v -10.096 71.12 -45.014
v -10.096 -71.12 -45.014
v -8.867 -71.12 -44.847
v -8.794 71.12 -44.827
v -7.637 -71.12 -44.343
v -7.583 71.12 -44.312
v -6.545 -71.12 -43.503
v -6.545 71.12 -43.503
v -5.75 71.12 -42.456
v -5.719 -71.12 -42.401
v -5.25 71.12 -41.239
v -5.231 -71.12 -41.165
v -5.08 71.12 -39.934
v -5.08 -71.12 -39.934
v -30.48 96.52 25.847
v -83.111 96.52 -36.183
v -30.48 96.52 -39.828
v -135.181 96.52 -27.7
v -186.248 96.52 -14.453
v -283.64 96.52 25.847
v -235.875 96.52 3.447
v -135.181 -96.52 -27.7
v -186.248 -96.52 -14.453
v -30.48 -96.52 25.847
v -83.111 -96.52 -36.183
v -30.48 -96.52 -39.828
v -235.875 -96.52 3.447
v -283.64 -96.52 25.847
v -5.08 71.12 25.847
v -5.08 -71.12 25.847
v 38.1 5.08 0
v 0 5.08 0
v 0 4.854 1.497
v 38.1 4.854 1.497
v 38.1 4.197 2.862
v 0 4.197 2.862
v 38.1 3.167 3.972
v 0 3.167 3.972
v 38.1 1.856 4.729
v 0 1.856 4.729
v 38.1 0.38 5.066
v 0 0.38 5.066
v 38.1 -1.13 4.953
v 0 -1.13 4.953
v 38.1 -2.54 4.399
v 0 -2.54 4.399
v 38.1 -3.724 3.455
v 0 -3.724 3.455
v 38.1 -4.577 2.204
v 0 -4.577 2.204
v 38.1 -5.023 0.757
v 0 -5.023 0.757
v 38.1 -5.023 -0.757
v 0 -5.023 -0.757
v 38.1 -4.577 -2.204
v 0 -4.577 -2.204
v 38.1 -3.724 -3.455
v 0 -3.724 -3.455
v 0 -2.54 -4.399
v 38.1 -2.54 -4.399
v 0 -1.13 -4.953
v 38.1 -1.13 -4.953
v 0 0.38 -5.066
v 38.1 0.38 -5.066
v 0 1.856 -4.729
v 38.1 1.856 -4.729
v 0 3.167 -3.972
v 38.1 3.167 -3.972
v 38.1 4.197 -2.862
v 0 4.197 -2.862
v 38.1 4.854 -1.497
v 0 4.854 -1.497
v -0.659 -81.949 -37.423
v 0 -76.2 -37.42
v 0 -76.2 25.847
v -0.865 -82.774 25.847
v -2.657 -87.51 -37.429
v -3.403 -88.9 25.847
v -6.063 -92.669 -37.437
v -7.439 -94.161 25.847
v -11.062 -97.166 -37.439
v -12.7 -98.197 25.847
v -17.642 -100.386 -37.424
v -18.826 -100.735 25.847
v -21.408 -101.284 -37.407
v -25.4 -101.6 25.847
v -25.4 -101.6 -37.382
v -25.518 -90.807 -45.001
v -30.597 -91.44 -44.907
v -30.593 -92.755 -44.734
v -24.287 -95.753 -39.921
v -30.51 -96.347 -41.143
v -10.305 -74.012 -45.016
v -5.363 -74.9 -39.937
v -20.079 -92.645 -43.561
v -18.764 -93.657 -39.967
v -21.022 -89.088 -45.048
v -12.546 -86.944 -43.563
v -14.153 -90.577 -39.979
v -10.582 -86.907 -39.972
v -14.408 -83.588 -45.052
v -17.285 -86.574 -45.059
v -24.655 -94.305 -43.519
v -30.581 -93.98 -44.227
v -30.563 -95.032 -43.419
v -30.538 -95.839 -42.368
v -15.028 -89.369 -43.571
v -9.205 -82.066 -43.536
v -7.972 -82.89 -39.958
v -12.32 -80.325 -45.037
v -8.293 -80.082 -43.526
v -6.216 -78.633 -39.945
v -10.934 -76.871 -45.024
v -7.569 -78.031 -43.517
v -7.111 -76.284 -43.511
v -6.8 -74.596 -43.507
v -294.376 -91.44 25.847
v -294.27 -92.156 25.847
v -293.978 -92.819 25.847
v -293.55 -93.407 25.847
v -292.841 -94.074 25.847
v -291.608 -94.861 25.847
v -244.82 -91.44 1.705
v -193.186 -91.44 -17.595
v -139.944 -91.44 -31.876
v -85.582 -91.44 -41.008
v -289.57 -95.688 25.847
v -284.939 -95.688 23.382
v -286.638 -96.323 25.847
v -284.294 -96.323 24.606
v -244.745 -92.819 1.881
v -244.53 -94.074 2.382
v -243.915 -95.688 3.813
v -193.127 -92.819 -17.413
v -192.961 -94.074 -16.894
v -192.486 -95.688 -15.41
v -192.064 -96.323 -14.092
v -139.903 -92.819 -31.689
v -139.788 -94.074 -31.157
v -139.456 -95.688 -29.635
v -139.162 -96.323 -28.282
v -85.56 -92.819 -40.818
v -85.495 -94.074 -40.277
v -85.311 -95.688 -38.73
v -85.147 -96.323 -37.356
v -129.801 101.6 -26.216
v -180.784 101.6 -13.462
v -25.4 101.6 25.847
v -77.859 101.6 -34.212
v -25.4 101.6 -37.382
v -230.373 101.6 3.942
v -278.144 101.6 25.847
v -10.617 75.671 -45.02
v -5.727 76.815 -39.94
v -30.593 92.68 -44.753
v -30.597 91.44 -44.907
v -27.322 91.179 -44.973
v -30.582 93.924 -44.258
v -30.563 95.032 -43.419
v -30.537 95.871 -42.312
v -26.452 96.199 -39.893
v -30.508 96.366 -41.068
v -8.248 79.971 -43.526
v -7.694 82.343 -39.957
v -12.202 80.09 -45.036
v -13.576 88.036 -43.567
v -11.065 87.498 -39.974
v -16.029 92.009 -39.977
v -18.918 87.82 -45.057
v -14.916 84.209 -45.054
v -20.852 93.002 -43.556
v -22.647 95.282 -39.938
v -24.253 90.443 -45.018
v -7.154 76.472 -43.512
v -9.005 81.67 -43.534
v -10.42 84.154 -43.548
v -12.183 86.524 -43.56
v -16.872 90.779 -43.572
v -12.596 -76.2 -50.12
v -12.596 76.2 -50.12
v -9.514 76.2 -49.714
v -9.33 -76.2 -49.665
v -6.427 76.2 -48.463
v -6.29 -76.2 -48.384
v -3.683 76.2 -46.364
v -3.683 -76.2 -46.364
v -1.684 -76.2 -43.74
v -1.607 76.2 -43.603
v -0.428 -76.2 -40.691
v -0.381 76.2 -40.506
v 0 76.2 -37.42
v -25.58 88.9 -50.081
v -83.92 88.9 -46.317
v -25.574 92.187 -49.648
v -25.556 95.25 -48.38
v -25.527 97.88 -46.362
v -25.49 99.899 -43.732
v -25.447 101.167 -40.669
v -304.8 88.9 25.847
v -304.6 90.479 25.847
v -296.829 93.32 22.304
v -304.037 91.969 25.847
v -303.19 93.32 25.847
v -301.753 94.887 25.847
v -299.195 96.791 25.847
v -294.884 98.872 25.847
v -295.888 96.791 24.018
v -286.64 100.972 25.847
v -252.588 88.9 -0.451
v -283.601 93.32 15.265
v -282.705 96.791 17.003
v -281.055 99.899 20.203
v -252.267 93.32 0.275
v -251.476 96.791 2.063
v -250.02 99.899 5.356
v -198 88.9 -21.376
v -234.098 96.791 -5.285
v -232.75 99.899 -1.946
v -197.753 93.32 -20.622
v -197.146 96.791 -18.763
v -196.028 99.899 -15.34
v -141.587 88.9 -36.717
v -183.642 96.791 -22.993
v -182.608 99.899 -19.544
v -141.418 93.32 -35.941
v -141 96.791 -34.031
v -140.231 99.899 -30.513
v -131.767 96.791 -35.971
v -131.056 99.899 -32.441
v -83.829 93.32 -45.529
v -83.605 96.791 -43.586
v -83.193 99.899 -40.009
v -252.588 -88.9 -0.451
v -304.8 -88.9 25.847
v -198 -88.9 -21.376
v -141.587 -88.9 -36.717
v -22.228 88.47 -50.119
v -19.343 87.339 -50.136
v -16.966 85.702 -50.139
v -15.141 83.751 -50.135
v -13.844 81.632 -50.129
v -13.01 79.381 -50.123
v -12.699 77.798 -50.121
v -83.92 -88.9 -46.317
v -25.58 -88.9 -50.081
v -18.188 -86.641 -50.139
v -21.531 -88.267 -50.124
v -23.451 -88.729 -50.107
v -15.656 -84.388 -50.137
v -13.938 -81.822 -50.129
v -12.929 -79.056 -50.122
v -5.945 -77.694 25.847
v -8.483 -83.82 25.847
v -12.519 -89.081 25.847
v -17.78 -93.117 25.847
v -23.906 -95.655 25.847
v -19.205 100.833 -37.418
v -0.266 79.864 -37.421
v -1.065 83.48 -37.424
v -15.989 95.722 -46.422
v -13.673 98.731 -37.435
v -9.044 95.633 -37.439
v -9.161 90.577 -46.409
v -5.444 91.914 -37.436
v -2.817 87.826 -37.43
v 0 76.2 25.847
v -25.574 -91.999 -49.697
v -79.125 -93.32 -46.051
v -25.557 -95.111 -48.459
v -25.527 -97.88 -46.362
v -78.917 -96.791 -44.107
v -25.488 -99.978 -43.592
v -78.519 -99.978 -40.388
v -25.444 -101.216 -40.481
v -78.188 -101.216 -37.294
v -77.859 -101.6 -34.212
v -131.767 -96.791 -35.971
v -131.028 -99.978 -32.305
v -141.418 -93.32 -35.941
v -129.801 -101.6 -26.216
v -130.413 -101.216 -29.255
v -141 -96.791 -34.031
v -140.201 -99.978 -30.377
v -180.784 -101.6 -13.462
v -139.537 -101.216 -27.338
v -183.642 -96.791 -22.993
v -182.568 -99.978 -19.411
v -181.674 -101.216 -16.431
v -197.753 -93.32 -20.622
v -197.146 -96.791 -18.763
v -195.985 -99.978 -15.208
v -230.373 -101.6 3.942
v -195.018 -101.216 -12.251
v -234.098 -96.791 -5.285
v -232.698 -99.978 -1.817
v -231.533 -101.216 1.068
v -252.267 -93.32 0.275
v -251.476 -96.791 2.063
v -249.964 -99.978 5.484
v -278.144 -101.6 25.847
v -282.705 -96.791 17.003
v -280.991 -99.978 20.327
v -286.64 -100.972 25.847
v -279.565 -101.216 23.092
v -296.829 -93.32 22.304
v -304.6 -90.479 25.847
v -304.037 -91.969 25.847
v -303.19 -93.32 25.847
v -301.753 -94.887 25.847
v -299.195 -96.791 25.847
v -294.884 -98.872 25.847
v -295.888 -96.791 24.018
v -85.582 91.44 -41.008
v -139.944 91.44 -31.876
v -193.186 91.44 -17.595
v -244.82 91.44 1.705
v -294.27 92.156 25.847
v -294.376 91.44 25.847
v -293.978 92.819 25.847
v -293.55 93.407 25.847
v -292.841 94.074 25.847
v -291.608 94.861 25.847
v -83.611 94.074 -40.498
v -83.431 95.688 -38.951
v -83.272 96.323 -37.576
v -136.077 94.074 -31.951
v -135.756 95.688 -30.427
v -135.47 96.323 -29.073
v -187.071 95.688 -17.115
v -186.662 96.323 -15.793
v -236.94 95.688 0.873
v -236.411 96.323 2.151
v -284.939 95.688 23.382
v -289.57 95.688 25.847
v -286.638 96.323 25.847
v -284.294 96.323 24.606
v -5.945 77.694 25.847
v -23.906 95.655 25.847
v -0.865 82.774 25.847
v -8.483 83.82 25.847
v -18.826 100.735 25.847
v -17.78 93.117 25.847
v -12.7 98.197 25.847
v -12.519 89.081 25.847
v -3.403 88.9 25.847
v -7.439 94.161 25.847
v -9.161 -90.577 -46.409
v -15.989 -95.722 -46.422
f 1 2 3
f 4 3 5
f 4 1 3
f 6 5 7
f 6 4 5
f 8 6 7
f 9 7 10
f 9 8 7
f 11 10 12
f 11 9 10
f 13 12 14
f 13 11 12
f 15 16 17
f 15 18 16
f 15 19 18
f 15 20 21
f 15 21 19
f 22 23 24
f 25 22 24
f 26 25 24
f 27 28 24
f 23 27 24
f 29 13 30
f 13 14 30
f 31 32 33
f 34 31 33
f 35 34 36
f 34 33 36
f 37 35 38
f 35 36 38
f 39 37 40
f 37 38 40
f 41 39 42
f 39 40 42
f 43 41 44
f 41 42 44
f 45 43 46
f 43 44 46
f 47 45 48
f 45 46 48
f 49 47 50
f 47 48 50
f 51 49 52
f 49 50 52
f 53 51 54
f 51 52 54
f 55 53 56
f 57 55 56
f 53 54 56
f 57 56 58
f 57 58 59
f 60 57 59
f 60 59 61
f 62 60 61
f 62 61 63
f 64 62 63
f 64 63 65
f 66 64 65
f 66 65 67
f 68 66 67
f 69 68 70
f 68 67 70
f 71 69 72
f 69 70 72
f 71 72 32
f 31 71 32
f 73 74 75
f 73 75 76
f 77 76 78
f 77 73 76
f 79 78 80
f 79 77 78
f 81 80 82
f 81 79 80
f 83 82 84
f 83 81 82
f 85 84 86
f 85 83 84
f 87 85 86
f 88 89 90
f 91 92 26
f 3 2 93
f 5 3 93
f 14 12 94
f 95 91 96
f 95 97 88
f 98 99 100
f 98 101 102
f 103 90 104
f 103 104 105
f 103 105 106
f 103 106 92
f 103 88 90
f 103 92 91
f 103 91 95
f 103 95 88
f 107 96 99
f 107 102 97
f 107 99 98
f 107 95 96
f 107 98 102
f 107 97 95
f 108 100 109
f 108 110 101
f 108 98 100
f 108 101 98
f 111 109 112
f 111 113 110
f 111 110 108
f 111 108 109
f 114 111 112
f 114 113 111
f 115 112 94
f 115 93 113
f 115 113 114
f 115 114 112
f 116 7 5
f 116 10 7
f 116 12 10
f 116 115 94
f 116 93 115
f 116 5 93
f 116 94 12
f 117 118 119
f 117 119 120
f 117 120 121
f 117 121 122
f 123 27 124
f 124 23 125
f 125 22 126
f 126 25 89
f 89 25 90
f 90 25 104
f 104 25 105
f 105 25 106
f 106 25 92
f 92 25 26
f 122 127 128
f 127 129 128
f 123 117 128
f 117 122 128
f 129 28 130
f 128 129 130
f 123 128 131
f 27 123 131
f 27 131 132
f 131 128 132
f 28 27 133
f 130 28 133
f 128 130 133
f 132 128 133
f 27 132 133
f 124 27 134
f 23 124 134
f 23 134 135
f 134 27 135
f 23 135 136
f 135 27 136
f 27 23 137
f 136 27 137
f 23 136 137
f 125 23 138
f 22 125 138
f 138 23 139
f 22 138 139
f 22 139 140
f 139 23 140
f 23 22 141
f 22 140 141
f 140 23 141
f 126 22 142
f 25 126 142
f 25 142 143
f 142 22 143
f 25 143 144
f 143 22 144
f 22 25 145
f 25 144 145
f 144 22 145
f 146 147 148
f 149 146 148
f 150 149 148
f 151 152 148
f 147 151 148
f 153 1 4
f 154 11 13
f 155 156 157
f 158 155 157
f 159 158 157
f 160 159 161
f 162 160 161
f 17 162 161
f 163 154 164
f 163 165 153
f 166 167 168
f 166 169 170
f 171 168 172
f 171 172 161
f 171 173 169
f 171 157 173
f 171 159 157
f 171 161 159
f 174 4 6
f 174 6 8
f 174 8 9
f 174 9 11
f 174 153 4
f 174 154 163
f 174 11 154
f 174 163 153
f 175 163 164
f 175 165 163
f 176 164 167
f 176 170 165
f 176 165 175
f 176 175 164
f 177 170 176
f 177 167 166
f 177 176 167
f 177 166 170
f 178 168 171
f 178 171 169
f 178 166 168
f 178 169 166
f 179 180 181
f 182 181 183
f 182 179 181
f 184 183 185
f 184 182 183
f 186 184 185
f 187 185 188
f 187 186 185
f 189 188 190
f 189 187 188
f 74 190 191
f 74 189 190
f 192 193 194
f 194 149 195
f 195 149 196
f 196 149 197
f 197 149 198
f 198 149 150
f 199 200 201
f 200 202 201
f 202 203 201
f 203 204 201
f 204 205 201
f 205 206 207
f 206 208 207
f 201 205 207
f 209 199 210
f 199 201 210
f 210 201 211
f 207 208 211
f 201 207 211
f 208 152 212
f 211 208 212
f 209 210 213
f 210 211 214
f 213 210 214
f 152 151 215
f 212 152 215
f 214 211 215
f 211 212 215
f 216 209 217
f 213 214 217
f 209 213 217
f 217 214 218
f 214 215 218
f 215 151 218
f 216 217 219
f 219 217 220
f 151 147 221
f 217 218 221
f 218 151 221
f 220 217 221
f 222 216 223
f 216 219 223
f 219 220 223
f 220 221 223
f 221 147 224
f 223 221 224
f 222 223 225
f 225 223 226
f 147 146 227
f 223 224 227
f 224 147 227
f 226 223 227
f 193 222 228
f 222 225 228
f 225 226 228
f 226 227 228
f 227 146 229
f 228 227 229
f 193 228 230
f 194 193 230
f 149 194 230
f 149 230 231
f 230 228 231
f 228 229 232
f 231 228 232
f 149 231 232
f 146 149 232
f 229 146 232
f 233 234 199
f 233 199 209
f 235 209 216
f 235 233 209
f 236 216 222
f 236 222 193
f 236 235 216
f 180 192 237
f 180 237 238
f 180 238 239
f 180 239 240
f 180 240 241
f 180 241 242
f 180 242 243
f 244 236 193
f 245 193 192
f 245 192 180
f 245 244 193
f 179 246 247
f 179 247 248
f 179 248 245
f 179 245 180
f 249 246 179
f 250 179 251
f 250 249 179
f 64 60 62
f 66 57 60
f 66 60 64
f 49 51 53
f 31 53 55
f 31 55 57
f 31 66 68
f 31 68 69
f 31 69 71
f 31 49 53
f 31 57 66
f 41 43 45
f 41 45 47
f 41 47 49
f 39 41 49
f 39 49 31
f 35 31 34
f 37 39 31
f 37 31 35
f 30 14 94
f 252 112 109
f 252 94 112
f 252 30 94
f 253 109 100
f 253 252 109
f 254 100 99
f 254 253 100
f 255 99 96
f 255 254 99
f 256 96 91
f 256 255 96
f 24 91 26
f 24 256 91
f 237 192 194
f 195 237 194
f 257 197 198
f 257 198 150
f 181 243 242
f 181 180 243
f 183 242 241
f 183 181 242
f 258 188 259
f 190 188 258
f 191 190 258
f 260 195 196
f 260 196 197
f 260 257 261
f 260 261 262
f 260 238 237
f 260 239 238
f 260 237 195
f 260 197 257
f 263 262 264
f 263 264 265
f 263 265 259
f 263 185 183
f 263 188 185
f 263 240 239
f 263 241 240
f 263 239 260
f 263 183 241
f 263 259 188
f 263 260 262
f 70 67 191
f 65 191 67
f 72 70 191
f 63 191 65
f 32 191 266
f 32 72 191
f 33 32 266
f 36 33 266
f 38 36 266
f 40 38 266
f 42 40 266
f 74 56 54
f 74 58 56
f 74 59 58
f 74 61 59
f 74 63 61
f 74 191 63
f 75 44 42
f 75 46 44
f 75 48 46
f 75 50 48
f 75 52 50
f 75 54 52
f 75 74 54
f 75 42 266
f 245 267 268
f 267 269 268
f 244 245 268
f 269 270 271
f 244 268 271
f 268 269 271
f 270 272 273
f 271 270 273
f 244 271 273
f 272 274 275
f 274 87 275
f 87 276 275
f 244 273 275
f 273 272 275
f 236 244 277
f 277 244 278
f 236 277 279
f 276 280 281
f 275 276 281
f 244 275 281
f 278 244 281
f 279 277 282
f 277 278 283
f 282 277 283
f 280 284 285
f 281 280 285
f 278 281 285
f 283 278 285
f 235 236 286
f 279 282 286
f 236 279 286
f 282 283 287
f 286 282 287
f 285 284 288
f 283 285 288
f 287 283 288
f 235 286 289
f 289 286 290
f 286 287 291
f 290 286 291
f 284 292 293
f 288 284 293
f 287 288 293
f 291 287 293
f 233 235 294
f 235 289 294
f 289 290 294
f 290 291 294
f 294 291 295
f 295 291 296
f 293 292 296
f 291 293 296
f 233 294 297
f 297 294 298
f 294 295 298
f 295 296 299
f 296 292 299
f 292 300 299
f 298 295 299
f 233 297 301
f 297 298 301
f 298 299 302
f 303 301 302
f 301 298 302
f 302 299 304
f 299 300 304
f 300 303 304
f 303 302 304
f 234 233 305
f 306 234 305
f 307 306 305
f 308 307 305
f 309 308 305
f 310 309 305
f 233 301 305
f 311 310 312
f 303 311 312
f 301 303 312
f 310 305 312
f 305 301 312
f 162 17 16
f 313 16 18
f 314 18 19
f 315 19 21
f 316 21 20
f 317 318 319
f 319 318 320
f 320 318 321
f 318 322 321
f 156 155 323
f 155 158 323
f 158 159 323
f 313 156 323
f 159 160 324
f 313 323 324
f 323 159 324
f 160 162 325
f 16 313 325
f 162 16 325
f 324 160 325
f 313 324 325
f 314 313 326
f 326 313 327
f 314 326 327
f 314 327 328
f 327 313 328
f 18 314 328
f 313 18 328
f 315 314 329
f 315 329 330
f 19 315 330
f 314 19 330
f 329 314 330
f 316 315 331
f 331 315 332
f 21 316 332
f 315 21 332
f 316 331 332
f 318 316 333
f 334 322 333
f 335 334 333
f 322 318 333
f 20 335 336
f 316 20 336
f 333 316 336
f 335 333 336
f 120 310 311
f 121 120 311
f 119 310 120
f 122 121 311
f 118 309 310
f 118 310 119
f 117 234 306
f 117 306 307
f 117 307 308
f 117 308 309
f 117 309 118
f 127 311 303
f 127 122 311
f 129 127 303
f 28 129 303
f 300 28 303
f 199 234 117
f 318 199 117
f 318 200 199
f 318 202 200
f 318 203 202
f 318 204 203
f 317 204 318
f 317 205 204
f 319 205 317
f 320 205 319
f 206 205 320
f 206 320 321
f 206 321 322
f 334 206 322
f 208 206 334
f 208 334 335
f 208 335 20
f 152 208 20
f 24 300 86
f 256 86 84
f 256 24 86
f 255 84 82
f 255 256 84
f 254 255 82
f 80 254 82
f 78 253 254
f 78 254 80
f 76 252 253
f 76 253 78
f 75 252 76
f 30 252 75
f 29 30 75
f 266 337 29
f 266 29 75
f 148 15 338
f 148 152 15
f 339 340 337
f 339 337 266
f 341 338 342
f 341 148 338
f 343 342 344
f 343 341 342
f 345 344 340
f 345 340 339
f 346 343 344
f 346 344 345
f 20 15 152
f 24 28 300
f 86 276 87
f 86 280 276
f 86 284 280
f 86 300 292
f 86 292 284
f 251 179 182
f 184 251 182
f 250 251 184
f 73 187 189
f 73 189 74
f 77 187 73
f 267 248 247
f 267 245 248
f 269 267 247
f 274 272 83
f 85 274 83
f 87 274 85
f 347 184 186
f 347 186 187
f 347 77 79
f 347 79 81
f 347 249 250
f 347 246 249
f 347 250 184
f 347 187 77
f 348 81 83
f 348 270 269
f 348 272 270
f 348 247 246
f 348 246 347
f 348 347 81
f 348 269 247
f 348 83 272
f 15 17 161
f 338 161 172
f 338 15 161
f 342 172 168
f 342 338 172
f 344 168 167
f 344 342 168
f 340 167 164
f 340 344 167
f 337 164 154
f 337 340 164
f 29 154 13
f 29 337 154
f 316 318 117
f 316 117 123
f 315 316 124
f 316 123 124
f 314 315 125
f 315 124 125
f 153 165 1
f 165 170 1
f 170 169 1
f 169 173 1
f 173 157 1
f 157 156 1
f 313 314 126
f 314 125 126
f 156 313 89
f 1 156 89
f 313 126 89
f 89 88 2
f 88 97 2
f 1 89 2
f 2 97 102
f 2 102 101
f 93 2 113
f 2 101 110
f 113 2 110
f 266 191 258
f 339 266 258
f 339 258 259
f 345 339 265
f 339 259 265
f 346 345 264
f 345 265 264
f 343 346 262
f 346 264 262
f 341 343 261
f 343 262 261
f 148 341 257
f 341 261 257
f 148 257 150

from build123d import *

# Parameters (mm, degrees)
F2_DEPTH     = 101.6
F3_T         = -5.08
F0_R         = 5.08
F4_DEPTH     = 38.1
F5_T4_DEPTH  = 134.2759536589
F5_S5_R      = 576.6246219757
F5_T6_DEPTH  = 71
F5_T10_DEPTH = 134.2759536589
F5_S11_R     = 576.6246219757
F5_T12_DEPTH = 71
F5_T13_DEPTH = 202.727744005
F6_R         = 12.7
F7_R         = 5.08


# Not quite as in the source:
# - a fillet or chamfer that OpenCascade refuses, or shapes differently, is made with other operations: its cross-section is extruded or revolved along the edge and cut away or added


with BuildPart() as f2:
    # F1 (on Front) → F2 (new body, symmetric)
    with BuildSketch(Plane.XZ):
        with BuildLine():
            Line((0, -49.880515784), (0, 25.847228221))
            Line((0, 25.847228221), (-304.8, 25.847228221))
            ThreePointArc((-304.8, 25.847228221), (-157.6074099904, -32.9761822695), (0, -49.880515784))
        make_face()
    extrude(amount=F2_DEPTH, both=True)

    # F3
    f3_openings = [f2.faces().sort_by_distance(p)[0] for p in [
        (-152.4, 0, 25.847228),
    ]]
    offset(amount=F3_T, openings=f3_openings)

    # F0 (on Right) → F4 (join)
    with BuildSketch(Plane.YZ):
        Circle(F0_R)
    extrude(amount=F4_DEPTH)

    # F5: fillet of radius 25.4 on 4 edges, made by hand


with BuildPart() as f5_tool2:
    # F5_s3 → F5_t4 (new body)
    with BuildSketch(Plane.XY.offset(25.847228221)):
        with BuildLine():
            ThreePointArc((-5.08, -71.12), (-12.5194877579, -89.0805122421), (-30.48, -96.52))
            Line((-30.48, -96.52), (-5.08, -96.52))
            Line((-5.08, -96.52), (-5.08, -71.12))
        make_face()
    extrude(amount=-F5_T4_DEPTH)

    # F5_s5 → F5_t6 (intersect, symmetric)
    with BuildSketch(Plane.XZ.offset(83.8)):
        with Locations((-17.3467118203, 531.5654050176)):
            Circle(F5_S5_R)
    extrude(amount=F5_T6_DEPTH, both=True, mode=Mode.INTERSECT)


with BuildPart() as f2_1:
    add(f2.part)

    # F5_t1: union F5_tool2
    add(f5_tool2.part)


with BuildPart() as f5_tool8:
    # F5_s9 → F5_t10 (new body)
    with BuildSketch(Plane.XY.offset(25.847228221)):
        with BuildLine():
            ThreePointArc((-30.48, 96.52), (-12.5194877579, 89.0805122421), (-5.08, 71.12))
            Line((-5.08, 71.12), (-5.08, 96.52))
            Line((-5.08, 96.52), (-30.48, 96.52))
        make_face()
    extrude(amount=-F5_T10_DEPTH)

    # F5_s11 → F5_t12 (intersect, symmetric)
    with BuildSketch(Plane.XZ.offset(-83.8)):
        with Locations((-17.3467118203, 531.5654050176)):
            Circle(F5_S11_R)
    extrude(amount=F5_T12_DEPTH, both=True, mode=Mode.INTERSECT)


with BuildPart() as f2_2:
    add(f2_1.part)

    # F5_t7: union F5_tool8
    add(f5_tool8.part)

    # F5_s14 → F5_t13 (cut)
    with BuildSketch(Plane.XY.offset(-113.380515784)):
        with BuildLine():
            ThreePointArc((0, -76.2), (-7.4394877579, -94.1605122421), (-25.4, -101.6))
            Line((-25.4, -101.6), (0, -101.6))
            Line((0, -101.6), (0, -76.2))
        make_face()
        with BuildLine():
            ThreePointArc((0, 76.2), (-7.4394877579, 94.1605122421), (-25.4, 101.6))
            Line((-25.4, 101.6), (0, 101.6))
            Line((0, 101.6), (0, 76.2))
        make_face()
    extrude(amount=F5_T13_DEPTH, mode=Mode.SUBTRACT)

    # F6
    f6_edges = [f2_2.edges().sort_by_distance(p)[0] for p in [
        (-7.439388, -94.160412, -50.054842),
        (0, 0, -49.880516),
        (-169.899659, -101.6, -29.779289),
        (-5.918318, 92.497978, -50.026943),
        (-169.899659, 101.6, -29.779289),
    ]]
    fillet(f6_edges, radius=F6_R)

    # F7
    f7_edges = [f2_2.edges().sort_by_distance(p)[0] for p in [
        (-166.679144, -96.52, -25.386819),
        (-10.998525, -87.418225, -45.024272),
        (-5.08, 0, -44.928725),
        (-11.01893, 87.442584, -45.024496),
        (-166.679144, 96.52, -25.386819),
    ]]
    fillet(f7_edges, radius=F7_R)


solid = f2_2.part
